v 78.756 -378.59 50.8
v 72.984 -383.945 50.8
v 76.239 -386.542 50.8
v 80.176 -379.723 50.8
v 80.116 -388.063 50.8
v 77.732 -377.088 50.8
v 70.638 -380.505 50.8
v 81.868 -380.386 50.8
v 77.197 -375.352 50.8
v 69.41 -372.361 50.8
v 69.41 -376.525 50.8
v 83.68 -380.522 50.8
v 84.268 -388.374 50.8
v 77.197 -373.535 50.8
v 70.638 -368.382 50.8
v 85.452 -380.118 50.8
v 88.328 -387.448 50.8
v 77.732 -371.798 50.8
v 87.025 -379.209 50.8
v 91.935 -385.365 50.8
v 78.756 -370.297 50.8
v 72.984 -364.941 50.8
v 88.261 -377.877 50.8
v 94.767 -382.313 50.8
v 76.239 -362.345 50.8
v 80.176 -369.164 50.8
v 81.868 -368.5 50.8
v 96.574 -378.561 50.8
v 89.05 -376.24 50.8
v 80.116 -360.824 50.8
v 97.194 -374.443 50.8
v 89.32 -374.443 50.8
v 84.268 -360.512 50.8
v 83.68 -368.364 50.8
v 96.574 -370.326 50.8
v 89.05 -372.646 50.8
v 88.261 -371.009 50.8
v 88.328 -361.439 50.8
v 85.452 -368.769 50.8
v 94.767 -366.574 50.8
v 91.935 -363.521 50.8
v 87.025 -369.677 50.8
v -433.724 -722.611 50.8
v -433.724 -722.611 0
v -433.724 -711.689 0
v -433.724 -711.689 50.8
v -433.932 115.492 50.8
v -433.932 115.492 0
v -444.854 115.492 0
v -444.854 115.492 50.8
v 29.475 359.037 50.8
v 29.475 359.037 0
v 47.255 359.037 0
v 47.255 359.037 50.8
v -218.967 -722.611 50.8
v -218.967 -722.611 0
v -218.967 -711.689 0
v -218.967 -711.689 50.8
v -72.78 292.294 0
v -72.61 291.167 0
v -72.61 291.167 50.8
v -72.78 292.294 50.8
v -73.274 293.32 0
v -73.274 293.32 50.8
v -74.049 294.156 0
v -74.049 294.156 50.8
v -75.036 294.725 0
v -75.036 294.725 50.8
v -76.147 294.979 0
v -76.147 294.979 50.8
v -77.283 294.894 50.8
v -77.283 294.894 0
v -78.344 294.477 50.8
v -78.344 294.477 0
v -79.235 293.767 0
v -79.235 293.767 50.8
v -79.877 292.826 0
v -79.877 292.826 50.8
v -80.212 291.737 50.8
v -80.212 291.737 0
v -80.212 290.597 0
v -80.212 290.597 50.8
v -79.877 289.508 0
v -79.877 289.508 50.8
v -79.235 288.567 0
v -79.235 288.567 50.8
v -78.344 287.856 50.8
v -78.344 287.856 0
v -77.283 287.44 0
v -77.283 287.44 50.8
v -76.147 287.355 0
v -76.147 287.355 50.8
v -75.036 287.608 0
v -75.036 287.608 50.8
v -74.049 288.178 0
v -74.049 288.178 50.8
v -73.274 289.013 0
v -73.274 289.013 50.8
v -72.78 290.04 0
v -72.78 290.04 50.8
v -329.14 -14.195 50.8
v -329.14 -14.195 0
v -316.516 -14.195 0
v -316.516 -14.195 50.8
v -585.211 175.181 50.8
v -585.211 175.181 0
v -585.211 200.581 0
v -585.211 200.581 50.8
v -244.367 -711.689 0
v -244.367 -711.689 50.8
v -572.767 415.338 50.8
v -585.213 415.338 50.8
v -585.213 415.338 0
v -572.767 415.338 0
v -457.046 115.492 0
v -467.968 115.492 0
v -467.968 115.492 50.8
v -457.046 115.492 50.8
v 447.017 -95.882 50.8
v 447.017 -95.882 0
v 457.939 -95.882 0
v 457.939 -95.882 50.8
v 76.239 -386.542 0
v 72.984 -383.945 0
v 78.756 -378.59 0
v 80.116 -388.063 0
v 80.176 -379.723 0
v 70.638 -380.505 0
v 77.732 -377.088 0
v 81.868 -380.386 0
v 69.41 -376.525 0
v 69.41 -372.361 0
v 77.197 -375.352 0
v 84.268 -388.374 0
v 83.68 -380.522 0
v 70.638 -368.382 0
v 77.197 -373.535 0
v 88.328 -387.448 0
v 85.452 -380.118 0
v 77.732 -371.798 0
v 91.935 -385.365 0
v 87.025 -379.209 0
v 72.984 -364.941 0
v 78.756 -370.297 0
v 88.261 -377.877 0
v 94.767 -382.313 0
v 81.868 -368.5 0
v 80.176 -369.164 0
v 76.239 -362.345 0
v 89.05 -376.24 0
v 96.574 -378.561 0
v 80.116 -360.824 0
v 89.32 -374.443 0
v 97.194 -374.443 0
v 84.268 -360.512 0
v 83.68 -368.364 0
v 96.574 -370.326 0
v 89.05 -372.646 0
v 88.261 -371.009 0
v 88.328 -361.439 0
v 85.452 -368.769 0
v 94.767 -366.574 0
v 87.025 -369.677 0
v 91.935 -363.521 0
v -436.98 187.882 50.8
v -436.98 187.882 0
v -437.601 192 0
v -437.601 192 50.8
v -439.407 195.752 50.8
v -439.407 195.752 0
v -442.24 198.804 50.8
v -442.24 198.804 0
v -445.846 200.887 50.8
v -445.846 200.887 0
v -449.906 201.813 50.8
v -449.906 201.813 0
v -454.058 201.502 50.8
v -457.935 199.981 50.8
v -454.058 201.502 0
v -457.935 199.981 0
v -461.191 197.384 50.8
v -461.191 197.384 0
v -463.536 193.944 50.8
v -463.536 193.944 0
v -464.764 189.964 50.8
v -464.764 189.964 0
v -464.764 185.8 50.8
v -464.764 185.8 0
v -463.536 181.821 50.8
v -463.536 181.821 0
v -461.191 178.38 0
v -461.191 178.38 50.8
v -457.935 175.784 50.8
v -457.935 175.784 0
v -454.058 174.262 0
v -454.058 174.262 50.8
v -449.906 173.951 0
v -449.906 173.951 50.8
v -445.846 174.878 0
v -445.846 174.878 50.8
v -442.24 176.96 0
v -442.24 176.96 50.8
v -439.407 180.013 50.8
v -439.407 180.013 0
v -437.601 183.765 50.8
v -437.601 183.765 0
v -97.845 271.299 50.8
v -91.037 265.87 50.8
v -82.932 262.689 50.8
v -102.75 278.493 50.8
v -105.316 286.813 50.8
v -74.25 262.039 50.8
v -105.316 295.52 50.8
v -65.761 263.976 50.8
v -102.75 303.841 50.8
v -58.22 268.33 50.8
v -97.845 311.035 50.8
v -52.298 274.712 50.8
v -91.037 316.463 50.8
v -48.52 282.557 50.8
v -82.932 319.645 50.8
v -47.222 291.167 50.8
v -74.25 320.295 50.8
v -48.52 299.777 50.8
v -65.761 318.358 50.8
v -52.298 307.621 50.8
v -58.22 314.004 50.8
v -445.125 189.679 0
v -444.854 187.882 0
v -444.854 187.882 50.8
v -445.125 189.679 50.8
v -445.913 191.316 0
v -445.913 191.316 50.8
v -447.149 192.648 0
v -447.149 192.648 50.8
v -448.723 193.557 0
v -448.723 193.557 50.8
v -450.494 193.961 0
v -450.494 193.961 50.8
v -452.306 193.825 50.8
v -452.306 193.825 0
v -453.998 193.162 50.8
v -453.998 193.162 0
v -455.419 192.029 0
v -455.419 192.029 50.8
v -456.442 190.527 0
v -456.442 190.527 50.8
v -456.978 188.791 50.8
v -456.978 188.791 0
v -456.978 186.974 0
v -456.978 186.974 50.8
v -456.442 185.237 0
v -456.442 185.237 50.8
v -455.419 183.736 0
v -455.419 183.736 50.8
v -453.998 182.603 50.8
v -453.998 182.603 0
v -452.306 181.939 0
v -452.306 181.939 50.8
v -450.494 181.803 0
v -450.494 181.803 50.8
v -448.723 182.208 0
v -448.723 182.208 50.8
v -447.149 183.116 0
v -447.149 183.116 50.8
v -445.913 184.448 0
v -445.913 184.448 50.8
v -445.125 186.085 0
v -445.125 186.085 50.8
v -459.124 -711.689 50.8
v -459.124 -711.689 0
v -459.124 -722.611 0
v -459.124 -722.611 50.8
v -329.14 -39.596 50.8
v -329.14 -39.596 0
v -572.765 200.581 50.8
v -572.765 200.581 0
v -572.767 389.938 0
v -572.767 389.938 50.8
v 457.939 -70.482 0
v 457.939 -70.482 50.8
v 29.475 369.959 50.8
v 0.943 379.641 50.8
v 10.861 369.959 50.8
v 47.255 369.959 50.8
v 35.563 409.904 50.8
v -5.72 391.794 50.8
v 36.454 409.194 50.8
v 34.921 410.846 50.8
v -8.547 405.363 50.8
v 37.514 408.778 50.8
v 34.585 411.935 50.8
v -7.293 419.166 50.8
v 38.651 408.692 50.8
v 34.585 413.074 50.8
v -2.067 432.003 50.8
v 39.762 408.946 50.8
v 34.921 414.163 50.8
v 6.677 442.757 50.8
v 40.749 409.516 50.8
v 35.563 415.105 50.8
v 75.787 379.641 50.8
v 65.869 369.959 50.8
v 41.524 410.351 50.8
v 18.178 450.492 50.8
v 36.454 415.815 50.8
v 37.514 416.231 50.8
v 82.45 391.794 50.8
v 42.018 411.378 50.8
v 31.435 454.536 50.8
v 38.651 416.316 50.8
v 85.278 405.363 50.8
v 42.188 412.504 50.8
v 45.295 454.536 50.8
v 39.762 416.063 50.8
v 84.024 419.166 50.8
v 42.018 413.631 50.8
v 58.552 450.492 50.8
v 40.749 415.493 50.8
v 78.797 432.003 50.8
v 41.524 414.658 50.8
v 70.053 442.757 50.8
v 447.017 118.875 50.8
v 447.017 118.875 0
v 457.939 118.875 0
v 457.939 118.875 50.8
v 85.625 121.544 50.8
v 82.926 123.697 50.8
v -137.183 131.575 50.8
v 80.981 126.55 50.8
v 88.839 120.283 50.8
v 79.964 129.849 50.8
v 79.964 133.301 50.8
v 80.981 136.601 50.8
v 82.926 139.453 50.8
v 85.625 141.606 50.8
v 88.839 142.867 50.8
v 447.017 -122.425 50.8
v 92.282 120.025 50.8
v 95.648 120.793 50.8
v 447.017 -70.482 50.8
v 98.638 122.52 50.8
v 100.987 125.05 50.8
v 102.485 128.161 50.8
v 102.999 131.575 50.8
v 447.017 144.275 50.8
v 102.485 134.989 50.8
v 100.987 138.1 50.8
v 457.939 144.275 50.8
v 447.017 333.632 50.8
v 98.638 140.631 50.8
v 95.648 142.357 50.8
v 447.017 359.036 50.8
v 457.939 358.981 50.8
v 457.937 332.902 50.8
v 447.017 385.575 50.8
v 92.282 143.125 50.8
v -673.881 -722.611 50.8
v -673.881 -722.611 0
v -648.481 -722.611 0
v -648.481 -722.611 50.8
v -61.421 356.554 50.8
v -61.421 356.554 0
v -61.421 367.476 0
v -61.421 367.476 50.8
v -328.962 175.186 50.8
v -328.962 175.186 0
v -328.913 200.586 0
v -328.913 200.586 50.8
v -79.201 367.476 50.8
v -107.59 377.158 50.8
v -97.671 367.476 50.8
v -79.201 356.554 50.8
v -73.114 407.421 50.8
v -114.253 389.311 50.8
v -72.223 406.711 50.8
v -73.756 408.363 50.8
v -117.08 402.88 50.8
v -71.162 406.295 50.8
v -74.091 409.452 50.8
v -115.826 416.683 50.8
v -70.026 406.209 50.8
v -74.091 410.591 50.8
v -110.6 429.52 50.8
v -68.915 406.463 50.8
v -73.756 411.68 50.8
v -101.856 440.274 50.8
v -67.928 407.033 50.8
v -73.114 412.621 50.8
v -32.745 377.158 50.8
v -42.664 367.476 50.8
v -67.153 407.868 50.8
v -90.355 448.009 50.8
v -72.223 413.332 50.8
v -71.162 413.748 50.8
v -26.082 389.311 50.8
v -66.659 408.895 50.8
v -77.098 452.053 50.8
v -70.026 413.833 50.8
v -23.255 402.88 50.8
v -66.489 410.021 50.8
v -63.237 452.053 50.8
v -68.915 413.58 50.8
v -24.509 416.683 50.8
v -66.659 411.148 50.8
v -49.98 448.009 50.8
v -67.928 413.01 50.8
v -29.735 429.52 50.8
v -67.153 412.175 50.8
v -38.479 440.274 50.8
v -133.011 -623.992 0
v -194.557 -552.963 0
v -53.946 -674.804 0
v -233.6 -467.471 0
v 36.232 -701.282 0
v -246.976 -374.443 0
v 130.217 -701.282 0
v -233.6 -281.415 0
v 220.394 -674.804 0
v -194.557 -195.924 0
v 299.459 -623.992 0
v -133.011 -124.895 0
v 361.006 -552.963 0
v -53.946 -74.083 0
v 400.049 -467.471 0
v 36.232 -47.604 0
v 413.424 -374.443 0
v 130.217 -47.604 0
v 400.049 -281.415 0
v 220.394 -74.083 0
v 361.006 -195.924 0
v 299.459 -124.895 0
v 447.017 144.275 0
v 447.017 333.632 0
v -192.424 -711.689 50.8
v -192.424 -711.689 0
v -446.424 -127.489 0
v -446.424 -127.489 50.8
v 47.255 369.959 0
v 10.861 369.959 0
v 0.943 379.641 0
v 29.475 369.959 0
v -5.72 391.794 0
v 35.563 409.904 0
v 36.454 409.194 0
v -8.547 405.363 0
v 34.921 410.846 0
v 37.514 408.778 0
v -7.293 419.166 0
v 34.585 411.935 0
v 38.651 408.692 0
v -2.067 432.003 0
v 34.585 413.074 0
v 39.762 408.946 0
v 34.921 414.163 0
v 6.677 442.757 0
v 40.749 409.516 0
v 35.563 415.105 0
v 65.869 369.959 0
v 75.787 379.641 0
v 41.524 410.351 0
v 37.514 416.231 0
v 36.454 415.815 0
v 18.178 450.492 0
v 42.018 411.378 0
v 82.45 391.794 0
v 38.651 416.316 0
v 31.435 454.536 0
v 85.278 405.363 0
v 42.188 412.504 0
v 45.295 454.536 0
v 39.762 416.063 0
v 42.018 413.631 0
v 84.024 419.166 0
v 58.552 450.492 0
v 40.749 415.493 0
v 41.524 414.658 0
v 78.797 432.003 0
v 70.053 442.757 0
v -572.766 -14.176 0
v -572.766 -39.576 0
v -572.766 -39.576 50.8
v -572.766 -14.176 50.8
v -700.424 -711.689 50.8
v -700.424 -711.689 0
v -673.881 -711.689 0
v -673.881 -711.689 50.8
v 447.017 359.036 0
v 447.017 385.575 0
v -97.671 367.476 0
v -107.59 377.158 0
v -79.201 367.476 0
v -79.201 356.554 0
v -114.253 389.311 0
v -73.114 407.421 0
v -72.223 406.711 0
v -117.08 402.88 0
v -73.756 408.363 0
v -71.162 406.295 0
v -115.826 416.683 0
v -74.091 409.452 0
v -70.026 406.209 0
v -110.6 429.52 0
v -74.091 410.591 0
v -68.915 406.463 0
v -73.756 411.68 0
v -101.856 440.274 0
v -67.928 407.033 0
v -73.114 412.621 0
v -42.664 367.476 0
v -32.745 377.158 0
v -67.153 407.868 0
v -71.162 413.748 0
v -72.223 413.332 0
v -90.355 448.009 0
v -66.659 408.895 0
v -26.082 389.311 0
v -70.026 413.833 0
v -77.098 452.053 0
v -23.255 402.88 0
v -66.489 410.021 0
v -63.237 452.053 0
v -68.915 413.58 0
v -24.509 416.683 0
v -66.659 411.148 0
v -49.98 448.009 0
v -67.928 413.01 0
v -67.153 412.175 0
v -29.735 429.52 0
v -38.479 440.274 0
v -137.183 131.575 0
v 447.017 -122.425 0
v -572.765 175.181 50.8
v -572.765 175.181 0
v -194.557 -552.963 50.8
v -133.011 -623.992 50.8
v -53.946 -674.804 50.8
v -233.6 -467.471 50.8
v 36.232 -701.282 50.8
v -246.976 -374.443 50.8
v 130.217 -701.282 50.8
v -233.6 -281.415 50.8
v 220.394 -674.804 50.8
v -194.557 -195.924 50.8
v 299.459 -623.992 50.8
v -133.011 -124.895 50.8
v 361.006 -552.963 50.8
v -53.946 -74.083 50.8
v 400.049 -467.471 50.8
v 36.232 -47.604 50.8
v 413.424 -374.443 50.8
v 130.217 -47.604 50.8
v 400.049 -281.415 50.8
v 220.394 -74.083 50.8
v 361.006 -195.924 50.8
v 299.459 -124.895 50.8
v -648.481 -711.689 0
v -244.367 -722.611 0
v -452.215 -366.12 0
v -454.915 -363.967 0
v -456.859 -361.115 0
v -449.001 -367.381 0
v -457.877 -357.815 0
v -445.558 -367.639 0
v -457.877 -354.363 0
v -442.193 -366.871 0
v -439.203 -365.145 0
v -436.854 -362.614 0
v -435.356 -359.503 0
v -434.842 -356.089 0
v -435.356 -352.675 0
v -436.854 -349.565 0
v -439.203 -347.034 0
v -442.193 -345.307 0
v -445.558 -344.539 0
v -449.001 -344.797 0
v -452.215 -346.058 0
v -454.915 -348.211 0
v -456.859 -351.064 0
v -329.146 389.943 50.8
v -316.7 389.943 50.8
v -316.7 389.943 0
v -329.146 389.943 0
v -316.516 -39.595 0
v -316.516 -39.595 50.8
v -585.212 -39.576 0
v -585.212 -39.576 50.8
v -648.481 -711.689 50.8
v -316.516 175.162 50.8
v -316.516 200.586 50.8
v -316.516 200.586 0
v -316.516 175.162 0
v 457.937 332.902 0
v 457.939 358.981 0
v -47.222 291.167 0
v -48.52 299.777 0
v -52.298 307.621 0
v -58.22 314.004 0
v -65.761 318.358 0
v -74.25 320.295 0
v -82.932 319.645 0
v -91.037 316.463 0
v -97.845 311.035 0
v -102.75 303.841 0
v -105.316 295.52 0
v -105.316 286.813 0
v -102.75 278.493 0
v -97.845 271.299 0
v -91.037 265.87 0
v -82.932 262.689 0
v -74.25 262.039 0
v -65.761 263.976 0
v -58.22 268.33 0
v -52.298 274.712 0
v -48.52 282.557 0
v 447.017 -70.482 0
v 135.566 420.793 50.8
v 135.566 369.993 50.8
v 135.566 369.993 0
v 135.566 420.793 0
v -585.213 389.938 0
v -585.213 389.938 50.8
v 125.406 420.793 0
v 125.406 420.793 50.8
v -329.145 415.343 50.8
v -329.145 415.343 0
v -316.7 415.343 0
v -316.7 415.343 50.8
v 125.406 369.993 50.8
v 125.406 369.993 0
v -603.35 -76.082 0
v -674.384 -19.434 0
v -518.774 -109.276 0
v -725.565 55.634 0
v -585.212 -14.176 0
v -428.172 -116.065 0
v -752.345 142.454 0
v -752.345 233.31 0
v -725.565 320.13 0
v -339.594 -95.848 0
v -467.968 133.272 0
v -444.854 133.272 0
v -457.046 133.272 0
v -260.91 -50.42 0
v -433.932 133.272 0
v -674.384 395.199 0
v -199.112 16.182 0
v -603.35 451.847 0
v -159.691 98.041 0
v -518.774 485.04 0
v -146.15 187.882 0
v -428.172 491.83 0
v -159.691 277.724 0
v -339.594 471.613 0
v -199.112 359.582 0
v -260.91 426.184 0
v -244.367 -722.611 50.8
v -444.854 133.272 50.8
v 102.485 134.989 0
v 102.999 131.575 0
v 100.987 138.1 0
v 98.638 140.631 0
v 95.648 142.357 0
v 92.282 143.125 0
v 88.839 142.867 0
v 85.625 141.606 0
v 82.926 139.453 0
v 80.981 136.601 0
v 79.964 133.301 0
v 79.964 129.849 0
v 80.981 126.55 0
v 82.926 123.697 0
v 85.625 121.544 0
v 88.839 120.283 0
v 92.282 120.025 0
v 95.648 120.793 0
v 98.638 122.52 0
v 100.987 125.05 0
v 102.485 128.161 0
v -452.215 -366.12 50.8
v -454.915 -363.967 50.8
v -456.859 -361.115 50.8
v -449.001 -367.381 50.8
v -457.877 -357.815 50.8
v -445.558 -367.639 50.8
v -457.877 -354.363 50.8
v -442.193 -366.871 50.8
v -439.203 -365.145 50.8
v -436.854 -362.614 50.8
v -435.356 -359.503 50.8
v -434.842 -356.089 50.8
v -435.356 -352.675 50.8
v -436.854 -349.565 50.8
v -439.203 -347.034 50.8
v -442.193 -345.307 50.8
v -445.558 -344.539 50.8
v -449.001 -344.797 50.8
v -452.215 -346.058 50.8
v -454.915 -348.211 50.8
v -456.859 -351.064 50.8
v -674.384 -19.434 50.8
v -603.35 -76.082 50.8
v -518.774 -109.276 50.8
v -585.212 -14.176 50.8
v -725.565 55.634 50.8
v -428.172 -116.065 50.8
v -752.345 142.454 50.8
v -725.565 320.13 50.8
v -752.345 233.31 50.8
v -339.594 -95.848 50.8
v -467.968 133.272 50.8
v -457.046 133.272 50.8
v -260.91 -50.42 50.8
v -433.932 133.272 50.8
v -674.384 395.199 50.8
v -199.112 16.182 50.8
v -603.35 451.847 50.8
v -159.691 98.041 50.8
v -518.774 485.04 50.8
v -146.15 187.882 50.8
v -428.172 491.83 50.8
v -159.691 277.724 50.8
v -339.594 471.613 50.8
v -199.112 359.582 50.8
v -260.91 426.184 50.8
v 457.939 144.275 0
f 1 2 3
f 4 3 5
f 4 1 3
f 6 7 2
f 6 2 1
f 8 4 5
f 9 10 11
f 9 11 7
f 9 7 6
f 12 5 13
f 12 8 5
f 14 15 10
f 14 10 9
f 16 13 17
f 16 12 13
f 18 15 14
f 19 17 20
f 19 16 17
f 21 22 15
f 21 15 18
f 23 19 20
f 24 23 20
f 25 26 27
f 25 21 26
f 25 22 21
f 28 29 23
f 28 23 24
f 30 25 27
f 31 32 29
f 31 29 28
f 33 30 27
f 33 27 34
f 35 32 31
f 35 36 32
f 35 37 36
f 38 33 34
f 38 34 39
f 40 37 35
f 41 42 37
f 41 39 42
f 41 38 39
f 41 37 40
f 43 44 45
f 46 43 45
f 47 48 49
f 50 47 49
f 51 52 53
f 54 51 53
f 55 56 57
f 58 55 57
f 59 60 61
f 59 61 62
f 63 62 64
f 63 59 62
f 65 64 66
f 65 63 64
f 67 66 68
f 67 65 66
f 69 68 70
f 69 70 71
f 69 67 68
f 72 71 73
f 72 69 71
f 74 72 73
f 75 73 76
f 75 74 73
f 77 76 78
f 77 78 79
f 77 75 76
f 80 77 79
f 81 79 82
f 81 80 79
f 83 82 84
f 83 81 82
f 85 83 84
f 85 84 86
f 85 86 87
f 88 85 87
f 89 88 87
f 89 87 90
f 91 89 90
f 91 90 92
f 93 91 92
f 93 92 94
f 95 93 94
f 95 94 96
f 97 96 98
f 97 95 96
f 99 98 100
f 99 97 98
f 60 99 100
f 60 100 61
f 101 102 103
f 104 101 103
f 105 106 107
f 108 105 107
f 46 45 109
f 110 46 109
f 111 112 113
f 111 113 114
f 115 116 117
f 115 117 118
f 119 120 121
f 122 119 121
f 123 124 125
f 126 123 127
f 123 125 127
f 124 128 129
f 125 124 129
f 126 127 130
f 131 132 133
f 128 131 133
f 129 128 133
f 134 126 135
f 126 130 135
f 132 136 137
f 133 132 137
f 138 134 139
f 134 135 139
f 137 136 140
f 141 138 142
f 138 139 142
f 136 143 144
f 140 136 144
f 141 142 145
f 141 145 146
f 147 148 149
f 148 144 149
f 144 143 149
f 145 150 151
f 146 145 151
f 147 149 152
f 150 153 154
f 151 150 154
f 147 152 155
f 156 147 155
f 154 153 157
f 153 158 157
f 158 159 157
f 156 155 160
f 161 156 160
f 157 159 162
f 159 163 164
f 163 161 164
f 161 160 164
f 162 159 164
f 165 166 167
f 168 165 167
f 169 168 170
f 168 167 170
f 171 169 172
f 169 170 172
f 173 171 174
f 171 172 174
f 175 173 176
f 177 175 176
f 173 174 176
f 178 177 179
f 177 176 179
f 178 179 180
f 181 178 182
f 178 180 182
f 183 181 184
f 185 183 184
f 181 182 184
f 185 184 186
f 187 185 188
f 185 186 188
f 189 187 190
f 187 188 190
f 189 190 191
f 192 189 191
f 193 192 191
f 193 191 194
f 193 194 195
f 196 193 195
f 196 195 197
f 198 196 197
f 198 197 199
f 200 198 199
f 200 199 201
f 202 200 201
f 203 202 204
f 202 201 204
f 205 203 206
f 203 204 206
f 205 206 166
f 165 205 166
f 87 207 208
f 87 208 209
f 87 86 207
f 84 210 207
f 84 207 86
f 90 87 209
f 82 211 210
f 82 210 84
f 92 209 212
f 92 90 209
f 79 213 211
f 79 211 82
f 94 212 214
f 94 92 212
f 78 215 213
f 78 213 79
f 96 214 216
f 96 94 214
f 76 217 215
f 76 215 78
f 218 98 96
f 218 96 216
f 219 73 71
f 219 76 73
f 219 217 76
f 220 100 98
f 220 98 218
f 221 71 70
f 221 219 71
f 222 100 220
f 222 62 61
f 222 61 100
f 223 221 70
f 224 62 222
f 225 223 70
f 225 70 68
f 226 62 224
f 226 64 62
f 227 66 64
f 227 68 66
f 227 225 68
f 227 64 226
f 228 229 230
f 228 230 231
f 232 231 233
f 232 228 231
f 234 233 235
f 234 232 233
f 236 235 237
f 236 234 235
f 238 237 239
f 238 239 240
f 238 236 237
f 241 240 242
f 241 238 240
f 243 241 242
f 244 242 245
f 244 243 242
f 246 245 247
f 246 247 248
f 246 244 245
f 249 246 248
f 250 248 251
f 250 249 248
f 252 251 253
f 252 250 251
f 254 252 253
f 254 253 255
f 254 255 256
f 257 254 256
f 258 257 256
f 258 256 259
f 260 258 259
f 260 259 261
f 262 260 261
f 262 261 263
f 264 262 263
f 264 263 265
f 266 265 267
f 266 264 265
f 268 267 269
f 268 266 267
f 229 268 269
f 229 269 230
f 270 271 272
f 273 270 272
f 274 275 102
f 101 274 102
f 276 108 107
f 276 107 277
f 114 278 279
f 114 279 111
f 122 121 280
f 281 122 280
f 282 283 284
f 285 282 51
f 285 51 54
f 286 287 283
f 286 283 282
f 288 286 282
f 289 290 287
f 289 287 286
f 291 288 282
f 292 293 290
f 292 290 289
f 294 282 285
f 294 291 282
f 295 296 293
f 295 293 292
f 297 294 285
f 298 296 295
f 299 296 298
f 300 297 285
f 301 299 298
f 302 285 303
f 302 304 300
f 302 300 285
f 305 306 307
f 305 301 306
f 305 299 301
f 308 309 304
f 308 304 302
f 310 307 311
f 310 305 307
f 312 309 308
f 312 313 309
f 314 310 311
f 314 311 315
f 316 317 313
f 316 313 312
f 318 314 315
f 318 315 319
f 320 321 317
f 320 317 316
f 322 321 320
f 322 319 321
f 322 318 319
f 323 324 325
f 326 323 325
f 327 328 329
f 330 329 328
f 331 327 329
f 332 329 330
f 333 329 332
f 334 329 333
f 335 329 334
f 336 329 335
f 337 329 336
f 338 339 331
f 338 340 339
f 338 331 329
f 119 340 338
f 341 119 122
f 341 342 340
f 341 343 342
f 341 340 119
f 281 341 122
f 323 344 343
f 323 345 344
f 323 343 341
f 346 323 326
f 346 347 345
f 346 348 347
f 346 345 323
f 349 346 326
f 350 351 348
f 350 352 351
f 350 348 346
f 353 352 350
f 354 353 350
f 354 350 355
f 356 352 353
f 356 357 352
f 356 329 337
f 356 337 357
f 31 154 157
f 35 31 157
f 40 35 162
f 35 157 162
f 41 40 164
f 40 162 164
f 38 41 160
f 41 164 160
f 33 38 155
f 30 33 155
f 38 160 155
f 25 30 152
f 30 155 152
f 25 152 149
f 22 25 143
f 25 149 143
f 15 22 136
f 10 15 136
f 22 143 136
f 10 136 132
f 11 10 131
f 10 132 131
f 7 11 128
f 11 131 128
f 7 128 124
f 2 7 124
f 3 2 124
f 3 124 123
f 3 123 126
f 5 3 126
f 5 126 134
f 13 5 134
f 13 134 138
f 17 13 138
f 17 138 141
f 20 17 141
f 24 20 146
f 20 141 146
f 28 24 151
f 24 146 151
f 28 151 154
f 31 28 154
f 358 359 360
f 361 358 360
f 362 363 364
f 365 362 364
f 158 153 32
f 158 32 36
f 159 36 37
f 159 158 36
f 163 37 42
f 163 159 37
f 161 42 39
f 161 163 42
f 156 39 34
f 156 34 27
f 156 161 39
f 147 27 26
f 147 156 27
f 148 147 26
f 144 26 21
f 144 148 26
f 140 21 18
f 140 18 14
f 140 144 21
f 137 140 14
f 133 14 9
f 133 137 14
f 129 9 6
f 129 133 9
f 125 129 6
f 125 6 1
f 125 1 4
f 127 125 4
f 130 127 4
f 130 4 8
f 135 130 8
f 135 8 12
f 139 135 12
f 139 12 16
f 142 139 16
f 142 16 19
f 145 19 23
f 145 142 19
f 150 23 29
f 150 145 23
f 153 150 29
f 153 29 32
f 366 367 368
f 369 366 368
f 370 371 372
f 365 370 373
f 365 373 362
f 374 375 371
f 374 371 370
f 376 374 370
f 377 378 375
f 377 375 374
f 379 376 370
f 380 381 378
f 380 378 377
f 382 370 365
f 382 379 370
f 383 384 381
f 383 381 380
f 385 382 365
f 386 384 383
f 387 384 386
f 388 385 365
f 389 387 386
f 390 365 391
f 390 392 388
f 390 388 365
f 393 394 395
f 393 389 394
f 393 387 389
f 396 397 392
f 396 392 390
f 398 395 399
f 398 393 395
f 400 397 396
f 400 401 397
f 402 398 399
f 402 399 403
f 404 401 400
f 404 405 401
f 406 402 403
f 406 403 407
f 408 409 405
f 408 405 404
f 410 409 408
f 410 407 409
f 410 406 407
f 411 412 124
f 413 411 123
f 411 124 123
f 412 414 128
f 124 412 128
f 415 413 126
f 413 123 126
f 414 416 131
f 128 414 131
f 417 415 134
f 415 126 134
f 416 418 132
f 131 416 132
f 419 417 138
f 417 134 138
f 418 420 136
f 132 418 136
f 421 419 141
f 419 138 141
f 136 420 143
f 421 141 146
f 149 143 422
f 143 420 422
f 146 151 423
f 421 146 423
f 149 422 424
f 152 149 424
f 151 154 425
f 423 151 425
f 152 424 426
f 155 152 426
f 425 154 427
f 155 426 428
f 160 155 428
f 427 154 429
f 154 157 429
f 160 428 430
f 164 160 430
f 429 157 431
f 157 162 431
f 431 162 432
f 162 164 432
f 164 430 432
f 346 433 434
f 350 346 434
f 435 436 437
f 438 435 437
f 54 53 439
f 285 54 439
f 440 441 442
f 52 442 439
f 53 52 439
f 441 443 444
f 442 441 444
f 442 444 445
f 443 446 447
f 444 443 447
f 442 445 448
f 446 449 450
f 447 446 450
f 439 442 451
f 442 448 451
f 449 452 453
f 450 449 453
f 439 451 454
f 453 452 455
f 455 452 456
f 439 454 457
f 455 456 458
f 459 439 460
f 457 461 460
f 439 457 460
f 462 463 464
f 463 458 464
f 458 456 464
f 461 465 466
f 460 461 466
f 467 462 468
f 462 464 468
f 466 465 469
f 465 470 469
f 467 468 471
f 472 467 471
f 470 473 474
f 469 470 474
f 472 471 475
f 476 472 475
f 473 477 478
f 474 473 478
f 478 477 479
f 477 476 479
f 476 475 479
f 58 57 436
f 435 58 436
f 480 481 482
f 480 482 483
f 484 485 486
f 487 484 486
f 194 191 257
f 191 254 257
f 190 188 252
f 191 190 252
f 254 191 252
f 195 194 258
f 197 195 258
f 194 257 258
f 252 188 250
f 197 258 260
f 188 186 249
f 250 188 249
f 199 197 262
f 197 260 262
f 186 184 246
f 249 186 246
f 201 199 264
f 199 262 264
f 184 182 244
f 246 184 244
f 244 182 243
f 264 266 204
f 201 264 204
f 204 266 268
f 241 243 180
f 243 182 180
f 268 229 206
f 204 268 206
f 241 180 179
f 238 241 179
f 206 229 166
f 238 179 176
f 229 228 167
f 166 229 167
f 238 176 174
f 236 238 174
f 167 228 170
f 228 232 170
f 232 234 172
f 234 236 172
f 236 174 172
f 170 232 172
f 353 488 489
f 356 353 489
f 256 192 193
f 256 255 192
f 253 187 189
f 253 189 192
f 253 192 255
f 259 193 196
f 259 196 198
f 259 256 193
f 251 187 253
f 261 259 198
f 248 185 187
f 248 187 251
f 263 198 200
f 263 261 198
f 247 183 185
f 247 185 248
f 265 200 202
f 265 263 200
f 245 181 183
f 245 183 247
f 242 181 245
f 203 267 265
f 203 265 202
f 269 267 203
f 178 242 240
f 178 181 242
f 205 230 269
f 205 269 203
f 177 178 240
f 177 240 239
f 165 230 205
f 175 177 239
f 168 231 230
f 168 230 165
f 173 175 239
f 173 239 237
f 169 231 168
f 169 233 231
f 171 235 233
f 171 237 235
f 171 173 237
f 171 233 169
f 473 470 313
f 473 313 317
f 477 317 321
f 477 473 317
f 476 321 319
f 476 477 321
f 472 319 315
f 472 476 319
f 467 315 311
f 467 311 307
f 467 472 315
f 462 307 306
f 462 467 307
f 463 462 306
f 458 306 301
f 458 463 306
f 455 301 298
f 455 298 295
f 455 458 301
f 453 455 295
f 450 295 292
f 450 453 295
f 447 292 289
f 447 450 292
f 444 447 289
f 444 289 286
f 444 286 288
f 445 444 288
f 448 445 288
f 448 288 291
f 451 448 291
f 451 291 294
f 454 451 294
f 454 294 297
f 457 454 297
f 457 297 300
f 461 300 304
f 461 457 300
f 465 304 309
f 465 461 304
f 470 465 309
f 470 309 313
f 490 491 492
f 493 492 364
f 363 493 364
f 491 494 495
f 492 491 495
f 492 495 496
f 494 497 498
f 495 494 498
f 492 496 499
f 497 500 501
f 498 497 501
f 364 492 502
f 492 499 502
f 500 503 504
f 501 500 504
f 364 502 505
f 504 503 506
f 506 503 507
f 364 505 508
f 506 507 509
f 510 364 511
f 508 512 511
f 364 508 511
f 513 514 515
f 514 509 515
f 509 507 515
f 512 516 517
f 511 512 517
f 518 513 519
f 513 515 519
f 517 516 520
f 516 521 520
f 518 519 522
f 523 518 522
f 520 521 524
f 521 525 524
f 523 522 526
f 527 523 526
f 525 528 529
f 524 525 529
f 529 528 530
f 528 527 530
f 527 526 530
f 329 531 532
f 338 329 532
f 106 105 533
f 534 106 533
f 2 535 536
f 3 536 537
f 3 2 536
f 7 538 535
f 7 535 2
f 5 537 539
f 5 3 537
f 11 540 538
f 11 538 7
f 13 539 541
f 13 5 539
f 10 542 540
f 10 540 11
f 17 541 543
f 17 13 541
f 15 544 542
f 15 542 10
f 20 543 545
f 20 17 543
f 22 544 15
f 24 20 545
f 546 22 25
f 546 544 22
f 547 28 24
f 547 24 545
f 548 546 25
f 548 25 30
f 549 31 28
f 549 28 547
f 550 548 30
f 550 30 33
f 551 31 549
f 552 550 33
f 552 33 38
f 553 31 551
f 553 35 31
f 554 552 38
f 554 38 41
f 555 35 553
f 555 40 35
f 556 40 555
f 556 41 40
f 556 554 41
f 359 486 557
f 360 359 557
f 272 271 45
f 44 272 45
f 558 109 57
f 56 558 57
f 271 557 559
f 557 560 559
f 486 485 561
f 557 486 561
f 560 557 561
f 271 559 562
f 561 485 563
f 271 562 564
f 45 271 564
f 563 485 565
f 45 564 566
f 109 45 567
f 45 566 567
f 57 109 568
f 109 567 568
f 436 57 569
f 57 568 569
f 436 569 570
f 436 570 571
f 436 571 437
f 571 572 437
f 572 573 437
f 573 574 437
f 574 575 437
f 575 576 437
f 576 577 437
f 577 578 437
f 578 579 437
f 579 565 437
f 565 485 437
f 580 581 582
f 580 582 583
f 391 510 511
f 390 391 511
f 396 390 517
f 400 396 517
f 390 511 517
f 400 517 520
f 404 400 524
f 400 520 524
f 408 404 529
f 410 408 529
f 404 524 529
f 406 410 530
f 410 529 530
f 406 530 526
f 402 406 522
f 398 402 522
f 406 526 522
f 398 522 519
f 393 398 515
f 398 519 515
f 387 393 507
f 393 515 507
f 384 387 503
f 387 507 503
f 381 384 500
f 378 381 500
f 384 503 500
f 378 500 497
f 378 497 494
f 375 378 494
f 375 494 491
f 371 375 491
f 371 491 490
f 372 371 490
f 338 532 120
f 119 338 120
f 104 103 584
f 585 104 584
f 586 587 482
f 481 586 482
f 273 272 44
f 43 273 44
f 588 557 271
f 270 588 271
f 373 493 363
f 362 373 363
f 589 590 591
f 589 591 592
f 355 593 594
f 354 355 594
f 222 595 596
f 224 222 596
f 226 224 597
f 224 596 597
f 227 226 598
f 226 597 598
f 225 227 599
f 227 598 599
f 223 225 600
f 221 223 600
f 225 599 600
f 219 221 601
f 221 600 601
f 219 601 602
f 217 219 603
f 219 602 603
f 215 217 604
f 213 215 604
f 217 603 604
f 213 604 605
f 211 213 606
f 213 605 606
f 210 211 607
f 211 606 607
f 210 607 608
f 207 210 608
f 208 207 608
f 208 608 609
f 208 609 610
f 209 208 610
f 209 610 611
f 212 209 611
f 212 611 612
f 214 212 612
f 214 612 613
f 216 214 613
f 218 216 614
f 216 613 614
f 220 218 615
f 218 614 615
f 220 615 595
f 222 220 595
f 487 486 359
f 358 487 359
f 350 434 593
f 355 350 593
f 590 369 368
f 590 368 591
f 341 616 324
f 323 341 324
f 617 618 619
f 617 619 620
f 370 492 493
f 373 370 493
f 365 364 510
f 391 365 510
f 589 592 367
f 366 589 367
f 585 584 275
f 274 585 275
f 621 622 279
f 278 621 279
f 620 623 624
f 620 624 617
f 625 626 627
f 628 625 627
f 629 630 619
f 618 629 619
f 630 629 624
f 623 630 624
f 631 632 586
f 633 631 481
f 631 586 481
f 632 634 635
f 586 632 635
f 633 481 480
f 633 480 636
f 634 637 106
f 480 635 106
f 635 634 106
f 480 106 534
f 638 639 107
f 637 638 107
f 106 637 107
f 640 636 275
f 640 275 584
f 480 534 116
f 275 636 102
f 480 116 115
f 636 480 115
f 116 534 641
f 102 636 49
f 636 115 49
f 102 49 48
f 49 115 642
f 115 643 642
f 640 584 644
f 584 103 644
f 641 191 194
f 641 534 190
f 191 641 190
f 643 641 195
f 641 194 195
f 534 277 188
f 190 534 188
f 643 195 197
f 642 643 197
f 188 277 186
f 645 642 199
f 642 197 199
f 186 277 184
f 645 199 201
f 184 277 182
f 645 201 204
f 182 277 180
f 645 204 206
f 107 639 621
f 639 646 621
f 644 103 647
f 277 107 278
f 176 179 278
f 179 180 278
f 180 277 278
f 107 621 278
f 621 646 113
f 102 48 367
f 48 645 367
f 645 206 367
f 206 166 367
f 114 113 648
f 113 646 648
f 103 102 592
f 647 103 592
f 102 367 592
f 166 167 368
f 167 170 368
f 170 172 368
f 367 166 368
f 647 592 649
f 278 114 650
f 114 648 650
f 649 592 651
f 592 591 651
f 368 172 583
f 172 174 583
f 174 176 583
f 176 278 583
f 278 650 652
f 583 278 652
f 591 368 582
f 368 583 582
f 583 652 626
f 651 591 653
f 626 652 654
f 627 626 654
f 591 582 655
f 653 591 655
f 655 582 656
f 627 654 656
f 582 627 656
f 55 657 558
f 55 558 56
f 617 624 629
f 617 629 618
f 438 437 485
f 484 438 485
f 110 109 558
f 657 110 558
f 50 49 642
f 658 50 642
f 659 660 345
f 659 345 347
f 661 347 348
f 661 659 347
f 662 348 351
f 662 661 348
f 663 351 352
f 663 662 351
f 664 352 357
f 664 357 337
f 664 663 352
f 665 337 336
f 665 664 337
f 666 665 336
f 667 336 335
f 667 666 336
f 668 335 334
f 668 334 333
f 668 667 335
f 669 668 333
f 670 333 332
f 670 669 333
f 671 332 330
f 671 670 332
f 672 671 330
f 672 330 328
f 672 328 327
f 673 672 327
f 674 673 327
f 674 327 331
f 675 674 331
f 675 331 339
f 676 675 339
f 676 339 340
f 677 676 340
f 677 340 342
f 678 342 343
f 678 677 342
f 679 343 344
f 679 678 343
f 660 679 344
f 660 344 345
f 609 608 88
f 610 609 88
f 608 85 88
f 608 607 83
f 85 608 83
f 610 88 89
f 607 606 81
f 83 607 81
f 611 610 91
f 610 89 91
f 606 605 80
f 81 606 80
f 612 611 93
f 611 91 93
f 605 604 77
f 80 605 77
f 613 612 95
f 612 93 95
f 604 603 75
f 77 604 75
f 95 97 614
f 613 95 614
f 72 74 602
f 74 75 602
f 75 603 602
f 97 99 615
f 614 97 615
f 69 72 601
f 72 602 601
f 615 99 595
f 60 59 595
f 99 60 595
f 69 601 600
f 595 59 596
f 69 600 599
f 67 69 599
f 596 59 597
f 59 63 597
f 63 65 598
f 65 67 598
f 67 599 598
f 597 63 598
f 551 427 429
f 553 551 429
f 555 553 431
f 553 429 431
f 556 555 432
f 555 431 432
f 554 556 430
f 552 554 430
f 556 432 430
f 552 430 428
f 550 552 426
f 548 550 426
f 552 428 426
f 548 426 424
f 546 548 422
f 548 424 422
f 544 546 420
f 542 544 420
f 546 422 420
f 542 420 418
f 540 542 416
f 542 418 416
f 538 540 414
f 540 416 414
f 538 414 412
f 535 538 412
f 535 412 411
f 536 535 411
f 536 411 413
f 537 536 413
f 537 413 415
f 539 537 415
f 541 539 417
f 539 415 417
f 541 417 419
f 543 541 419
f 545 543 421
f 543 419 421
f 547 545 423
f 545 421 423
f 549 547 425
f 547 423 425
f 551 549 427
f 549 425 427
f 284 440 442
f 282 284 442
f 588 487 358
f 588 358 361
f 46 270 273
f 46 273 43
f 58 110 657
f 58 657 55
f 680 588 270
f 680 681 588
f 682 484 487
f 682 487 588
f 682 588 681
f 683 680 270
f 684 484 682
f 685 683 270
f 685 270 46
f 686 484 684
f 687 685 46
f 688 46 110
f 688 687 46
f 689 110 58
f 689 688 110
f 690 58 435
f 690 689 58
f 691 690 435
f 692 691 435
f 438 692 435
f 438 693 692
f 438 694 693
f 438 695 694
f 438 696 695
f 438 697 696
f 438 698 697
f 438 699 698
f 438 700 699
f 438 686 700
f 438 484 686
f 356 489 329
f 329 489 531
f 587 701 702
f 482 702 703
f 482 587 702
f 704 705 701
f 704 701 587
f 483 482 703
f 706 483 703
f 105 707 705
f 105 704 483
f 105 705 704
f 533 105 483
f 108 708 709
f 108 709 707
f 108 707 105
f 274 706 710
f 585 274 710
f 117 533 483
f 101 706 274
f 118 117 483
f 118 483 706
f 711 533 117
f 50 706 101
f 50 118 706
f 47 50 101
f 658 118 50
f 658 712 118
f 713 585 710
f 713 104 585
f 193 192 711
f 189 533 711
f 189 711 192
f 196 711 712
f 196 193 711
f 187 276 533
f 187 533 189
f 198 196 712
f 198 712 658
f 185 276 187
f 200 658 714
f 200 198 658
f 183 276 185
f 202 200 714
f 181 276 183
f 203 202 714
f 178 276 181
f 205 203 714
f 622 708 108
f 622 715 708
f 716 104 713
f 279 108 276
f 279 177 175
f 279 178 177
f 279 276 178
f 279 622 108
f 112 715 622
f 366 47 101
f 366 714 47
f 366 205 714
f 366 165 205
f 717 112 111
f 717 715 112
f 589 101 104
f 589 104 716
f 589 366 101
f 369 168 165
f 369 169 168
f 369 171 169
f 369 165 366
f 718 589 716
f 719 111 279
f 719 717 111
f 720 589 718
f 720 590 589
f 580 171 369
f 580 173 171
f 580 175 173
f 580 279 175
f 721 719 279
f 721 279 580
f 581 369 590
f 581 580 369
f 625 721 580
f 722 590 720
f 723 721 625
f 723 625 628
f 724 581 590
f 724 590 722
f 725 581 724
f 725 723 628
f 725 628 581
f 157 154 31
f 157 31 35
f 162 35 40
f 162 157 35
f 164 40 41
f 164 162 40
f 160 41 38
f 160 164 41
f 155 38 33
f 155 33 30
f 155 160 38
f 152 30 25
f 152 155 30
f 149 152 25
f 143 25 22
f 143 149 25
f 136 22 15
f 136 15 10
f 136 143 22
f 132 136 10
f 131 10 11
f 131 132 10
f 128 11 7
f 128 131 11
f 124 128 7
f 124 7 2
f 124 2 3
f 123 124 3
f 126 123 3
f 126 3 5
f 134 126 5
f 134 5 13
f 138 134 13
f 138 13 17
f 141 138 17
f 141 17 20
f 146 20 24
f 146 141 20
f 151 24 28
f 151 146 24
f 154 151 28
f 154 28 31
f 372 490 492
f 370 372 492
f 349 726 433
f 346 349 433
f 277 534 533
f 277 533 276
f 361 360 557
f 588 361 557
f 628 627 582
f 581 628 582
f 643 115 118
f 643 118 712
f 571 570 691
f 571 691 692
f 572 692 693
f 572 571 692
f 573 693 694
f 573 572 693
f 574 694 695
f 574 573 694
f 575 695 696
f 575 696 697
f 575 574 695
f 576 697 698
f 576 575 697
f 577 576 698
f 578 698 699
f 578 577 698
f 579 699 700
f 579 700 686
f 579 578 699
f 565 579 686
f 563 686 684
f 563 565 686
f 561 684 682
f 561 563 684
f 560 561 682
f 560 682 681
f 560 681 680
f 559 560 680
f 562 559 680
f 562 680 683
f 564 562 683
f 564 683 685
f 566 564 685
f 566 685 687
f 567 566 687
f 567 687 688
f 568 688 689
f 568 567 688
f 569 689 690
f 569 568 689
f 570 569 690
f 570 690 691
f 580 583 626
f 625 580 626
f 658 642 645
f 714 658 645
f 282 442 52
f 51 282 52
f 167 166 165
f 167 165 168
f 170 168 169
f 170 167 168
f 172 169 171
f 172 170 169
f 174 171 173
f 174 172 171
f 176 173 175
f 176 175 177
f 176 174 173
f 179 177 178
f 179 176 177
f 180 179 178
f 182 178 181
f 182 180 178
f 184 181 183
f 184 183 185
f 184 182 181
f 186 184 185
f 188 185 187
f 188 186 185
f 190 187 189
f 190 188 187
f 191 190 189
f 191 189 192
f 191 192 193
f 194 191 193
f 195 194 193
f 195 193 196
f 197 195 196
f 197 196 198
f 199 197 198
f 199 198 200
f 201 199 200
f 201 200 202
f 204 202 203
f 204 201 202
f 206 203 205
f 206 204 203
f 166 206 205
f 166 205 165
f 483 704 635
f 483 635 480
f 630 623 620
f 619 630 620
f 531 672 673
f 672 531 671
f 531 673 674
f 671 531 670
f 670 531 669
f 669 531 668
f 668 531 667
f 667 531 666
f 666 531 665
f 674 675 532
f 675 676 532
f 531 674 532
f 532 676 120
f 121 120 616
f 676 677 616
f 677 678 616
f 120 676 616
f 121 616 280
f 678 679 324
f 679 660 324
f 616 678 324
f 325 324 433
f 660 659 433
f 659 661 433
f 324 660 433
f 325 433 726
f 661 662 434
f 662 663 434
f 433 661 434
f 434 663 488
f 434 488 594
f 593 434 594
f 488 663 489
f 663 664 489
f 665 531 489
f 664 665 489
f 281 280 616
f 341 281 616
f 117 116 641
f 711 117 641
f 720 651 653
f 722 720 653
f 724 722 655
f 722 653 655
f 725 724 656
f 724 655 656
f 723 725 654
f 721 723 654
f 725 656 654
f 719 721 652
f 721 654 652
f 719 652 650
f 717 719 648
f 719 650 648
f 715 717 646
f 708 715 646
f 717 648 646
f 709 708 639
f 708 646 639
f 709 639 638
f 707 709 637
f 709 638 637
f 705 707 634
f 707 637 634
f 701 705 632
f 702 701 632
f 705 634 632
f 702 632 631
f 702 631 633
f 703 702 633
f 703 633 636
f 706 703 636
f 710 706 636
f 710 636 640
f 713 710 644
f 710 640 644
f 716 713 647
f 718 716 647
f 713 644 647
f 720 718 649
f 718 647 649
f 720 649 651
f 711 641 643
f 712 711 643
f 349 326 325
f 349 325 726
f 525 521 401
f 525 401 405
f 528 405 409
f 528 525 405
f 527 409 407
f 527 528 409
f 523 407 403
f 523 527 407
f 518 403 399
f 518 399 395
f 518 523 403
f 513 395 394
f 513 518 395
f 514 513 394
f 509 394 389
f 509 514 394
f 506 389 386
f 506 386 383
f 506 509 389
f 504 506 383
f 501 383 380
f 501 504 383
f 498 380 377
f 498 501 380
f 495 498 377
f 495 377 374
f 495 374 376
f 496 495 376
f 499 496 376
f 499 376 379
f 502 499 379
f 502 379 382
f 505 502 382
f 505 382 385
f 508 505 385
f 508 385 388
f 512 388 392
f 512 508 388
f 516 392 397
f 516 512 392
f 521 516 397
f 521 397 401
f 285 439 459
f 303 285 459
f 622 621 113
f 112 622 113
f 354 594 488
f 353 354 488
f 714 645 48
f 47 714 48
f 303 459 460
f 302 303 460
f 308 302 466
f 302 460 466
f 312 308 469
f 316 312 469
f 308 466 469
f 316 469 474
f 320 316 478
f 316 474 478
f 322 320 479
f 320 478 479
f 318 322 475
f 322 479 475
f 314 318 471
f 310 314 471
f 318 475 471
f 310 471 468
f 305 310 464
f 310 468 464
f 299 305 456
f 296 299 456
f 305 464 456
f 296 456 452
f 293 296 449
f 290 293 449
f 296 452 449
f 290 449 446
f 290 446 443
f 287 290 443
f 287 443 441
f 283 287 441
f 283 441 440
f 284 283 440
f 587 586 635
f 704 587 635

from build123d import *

# Parameters (mm, degrees)
F0_R     = 11.5824
F0_R_2   = 29.21
F0_R_3   = 3.8227
F0_W     = 10.16
F0_H     = 50.8
F0_R_4   = 13.97
F0_R_5   = 6.096
F1_DEPTH = 50.8
F0_R_6   = 304.8
F0_W_2   = 12.446
F0_H_2   = 25.4
F0_W_3   = 10.922
F0_H_3   = 17.78
F0_R_7   = 330.2
F2_DEPTH = 50.8


with BuildPart() as f1:
    # F0 (on Top) → F1 (new body)
    with BuildSketch(Plane.XY):
        Polygon((-137.183315, 131.575095), (447.016685, -122.424905), (447.016685, -95.881905), (457.938685, -95.881905), (457.938685, -70.481905), (447.016685, -70.481905), (447.016685, 111.026304), (447.016685, 118.875095), (457.938685, 118.875095), (457.938685, 144.275095), (447.016685, 144.275095), (447.016685, 333.632095), (457.937395, 332.901672), (457.93855, 358.981327), (447.016685, 359.035666), (447.016685, 385.575095), align=None)
        with Locations((91.416685, 131.575095)):
            Circle(F0_R, mode=Mode.SUBTRACT)
        with Locations((-76.432413, 291.166897)):
            Circle(F0_R_2)
        with Locations((-76.432413, 291.166897)):
            Circle(F0_R_3, mode=Mode.SUBTRACT)
        with BuildLine():
            Line((-61.421408, 367.476403), (-42.66391, 367.476403))
            ThreePointArc((-42.66391, 367.476403), (-70.167548, 452.566403), (-97.671186, 367.476403))
            Line((-97.671186, 367.476403), (-79.201408, 367.476403))
            Line((-79.201408, 367.476403), (-79.201408, 356.554403))
            Line((-79.201408, 356.554403), (-61.421408, 356.554403))
            Line((-61.421408, 356.554403), (-61.421408, 367.476403))
        make_face()
        with Locations((-70.311408, 410.021403)):
            Circle(F0_R_3, mode=Mode.SUBTRACT)
        with BuildLine():
            Line((47.25512, 369.959414), (65.868758, 369.959414))
            ThreePointArc((65.868758, 369.959414), (38.36512, 455.049414), (10.861482, 369.959414))
            Line((10.861482, 369.959414), (29.47512, 369.959414))
            Line((29.47512, 369.959414), (29.47512, 359.037414))
            Line((29.47512, 359.037414), (47.25512, 359.037414))
            Line((47.25512, 359.037414), (47.25512, 369.959414))
        make_face()
        with Locations((38.36512, 412.504414)):
            Circle(F0_R_3, mode=Mode.SUBTRACT)
        with Locations((130.4862, 395.392873)):
            Rectangle(F0_W, F0_H)
        Polygon((-446.424039, -127.489146), (-700.424039, -711.689146), (-673.881039, -711.689146), (-673.881039, -722.611146), (-648.481039, -722.611146), (-648.481039, -711.689146), (-459.124039, -711.689146), (-459.124039, -722.611146), (-433.724039, -722.611146), (-433.724039, -711.689146), (-244.367039, -711.689146), (-244.367039, -722.611146), (-218.967039, -722.611146), (-218.967039, -711.689146), (-192.424039, -711.689146), align=None)
        with Locations((-446.424039, -356.089146)):
            Circle(F0_R, mode=Mode.SUBTRACT)
        with Locations((-450.94986, 187.882235)):
            Circle(F0_R_4)
        with Locations((-450.94986, 187.882235)):
            Circle(F0_R_5, mode=Mode.SUBTRACT)
        with Locations((83.224431, -374.443263)):
            Circle(F0_R_4)
        with Locations((83.224431, -374.443263)):
            Circle(F0_R_5, mode=Mode.SUBTRACT)
    extrude(amount=F1_DEPTH)


with BuildPart() as f2:
    # F0 (on Top) → F2 (new body)
    with BuildSketch(Plane.XY):
        with Locations((-450.94986, 187.882235)):
            Circle(F0_R_6)
        with Locations((-578.988549, -26.876191)):
            Rectangle(F0_W_2, F0_H_2, mode=Mode.SUBTRACT)
        with Locations((-578.988415, 187.880809)):
            Rectangle(F0_W_2, F0_H_2, mode=Mode.SUBTRACT)
        with Locations((-462.50686, 124.382235)):
            Rectangle(F0_W_3, F0_H_3, mode=Mode.SUBTRACT)
        Polygon((-329.140095, -39.596164), (-329.140095, -14.194817), (-316.516302, -14.194817), (-316.516302, -39.594817), align=None, mode=Mode.SUBTRACT)
        Polygon((-444.85386, 115.492235), (-444.85386, 133.272235), (-433.93186, 133.272368), (-433.93186, 115.492235), align=None, mode=Mode.SUBTRACT)
        with Locations((-450.94986, 187.882235)):
            Circle(F0_R_4, mode=Mode.SUBTRACT)
        Polygon((-316.516302, 175.162183), (-328.962279, 175.186283), (-328.913095, 200.586235), (-316.516302, 200.586235), align=None, mode=Mode.SUBTRACT)
        with Locations((-578.990251, 402.637809)):
            Rectangle(F0_W_2, F0_H_2, mode=Mode.SUBTRACT)
        Polygon((-316.69956, 389.943235), (-329.14556, 389.943236), (-329.145317, 415.343236), (-316.69956, 415.343236), align=None, mode=Mode.SUBTRACT)
        with Locations((83.224431, -374.443263)):
            Circle(F0_R_7)
        with Locations((83.224431, -374.443263)):
            Circle(F0_R_4, mode=Mode.SUBTRACT)
    extrude(amount=F2_DEPTH)


solid = Compound([f1.part, f2.part])
